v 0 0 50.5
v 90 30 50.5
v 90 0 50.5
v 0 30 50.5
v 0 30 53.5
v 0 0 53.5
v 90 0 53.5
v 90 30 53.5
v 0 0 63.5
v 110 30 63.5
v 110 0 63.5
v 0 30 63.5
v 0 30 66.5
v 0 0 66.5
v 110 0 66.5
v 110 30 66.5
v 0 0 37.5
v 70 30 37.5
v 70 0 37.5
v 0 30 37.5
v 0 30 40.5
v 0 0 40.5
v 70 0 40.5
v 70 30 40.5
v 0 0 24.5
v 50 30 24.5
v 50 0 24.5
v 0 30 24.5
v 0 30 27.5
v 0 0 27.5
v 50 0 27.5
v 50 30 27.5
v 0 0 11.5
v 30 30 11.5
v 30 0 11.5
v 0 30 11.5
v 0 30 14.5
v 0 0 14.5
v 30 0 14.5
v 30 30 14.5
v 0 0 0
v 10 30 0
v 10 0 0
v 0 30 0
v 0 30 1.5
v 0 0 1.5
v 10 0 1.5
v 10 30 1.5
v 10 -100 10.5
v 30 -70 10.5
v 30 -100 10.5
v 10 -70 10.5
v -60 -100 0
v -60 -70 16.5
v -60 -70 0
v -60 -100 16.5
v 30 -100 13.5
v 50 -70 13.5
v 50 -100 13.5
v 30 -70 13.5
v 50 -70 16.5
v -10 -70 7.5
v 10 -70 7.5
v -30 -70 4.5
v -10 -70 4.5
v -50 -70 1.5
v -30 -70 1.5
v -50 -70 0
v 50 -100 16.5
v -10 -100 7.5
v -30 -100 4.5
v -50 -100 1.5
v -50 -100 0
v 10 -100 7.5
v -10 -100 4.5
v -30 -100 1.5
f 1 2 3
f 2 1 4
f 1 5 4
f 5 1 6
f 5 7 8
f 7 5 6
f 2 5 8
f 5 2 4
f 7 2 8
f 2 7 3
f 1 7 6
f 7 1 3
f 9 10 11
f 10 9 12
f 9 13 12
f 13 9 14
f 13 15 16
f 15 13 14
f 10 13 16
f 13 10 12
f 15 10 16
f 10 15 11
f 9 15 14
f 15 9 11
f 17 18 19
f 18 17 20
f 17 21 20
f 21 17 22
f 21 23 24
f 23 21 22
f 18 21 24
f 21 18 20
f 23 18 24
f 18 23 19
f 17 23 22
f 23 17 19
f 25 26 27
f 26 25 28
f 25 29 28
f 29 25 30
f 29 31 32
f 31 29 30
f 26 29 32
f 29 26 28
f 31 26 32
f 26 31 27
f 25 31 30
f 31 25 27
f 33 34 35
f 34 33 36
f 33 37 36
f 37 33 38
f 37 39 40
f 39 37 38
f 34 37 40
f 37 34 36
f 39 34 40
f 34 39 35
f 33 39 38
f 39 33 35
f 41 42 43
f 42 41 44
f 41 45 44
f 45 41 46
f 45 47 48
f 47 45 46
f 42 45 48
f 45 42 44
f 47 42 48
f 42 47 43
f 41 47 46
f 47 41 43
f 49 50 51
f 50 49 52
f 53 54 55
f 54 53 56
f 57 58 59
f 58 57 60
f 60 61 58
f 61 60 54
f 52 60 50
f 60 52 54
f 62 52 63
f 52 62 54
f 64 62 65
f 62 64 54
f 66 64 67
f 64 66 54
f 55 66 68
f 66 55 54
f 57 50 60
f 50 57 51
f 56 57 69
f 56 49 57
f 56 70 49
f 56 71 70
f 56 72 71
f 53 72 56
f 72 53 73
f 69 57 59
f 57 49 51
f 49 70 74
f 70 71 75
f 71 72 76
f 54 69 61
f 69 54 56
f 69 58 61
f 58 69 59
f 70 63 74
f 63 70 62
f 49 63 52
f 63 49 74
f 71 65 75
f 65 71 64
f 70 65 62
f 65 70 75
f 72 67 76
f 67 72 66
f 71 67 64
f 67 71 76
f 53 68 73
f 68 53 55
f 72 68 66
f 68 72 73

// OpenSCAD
// file: layers.scad
layer_thicknesses = [1.5, 3, 3, 3, 3, 3]; // vector of layer thickness values from bottom layer to top

max_layer_size = [60, 100]; // maximum x and y size of layers, just used for visualization and spacing of layers in the vector export

// renders a layer in 3d
module layer_3d(layer = 0) {
	linear_extrude(height = layer_thicknesses[layer]) {
		layer_2d(layer);
	}
}

// this module is where the actual layer shapes are defined
module layer_2d(layer = 0) {
	square(size = [20*layer + 10,30]);
}
// main file
// Exploded and solid views of assembled case
// this file is meant to help visualize when editing, but could be used to generate 3d preview images

include <layers.scad>;

display_spacing = 10;

layer_count = len(layer_thicknesses);

// exploded stack
translate([0, 0, 0]) {
	stack_layers(layer=0, extraSpace = display_spacing);
}

// solid stack
translate([-max_layer_size[0], -max_layer_size[1], 0]) {
	stack_layers(layer=0);
}

module layout_layers(layer = 0, extraSpace = display_spacing) {
	layer_2d(layer);
	
	if(layer + 1 < layer_count) {
		translate([max_layer_size[0] + extraSpace, 0, 0]) {
			layout_layers(layer = layer + 1, extraSpace = extraSpace);
		}
	}
}

module stack_layers(layer = 0, extraSpace = 0) {
	value = (layer)/len(layer_thicknesses)/3 + 0.4;
	
	color(c = [value, value, value]) linear_extrude(height = layer_thicknesses[layer]) {
		layer_2d(layer);
	}
	
	if(layer + 1 < layer_count) {
		translate([0, 0, layer_thicknesses[layer] + extraSpace]) {
			stack_layers(layer = layer + 1, extraSpace = extraSpace);
		}
	}
}
